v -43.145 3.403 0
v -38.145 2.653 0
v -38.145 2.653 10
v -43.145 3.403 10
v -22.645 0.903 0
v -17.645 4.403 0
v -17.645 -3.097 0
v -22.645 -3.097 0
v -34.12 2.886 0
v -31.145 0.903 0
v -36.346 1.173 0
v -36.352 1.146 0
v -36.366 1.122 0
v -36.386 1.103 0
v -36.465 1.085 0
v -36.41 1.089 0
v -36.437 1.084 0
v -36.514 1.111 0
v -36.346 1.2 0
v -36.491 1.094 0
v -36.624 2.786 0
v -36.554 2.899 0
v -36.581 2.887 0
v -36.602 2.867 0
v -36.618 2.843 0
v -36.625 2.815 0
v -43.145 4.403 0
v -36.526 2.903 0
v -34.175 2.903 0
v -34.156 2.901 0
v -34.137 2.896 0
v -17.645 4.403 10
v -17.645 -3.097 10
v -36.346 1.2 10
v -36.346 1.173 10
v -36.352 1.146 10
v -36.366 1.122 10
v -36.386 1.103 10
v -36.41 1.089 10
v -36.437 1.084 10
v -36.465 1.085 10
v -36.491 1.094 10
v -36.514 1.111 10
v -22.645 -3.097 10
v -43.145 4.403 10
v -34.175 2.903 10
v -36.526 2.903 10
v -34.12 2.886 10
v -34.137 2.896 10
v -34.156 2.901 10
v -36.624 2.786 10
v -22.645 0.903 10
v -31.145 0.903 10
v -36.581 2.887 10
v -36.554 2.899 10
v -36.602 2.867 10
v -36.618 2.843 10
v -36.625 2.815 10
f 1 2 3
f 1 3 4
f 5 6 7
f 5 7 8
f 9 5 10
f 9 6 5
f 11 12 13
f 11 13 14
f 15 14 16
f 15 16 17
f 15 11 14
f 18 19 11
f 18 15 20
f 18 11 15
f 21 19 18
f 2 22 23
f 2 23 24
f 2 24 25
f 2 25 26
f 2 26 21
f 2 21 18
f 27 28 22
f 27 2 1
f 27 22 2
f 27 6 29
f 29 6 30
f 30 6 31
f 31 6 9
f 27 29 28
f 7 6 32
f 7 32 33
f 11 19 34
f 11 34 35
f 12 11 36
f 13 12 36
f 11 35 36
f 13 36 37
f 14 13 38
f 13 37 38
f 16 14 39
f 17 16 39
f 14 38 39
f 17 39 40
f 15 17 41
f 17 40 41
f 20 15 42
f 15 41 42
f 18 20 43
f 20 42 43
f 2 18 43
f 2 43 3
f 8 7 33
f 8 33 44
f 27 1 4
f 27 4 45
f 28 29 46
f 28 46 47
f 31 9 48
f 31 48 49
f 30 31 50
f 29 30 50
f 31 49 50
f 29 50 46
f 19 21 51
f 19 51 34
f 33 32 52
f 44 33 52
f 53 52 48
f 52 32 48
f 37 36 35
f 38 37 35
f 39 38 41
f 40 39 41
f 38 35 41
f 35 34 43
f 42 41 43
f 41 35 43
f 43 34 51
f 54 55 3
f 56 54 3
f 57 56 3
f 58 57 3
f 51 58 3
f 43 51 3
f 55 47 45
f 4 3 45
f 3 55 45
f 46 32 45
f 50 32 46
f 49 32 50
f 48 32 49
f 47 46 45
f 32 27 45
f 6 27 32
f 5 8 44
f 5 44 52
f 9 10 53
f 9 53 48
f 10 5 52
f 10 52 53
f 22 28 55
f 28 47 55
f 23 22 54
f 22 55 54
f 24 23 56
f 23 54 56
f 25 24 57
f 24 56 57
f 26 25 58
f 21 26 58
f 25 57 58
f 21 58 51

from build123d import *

# Parameters (mm, degrees)
BOSS_EXTRUDE1_DEPTH = 10
FILLET1_R           = 0.1


with BuildPart() as part:
    # Sketch1 → Boss-Extrude1 (new body)
    with BuildSketch(Plane.XY):
        Polygon((-17.64487365, -3.096839142), (-22.64487365, -3.096839142), (-22.64487365, 0.903160858), (-31.14487365, 0.903160858), (-34.14487365, 2.903160858), (-36.64487365, 2.903160858), (-36.294355732, 0.903160858), (-38.14487365, 2.653160858), (-43.14487365, 3.403160858), (-43.14487365, 4.403160858), (-17.64487365, 4.403160858), align=None)
    extrude(amount=BOSS_EXTRUDE1_DEPTH)

    # Fillet1
    fillet1_edges = [part.edges().sort_by_distance(p)[0] for p in [
        (-34.14487365, 2.903160858, 5),
        (-36.64487365, 2.903160858, 5),
        (-36.294355732, 0.903160858, 5),
    ]]
    fillet(fillet1_edges, radius=FILLET1_R)


solid = part.part
